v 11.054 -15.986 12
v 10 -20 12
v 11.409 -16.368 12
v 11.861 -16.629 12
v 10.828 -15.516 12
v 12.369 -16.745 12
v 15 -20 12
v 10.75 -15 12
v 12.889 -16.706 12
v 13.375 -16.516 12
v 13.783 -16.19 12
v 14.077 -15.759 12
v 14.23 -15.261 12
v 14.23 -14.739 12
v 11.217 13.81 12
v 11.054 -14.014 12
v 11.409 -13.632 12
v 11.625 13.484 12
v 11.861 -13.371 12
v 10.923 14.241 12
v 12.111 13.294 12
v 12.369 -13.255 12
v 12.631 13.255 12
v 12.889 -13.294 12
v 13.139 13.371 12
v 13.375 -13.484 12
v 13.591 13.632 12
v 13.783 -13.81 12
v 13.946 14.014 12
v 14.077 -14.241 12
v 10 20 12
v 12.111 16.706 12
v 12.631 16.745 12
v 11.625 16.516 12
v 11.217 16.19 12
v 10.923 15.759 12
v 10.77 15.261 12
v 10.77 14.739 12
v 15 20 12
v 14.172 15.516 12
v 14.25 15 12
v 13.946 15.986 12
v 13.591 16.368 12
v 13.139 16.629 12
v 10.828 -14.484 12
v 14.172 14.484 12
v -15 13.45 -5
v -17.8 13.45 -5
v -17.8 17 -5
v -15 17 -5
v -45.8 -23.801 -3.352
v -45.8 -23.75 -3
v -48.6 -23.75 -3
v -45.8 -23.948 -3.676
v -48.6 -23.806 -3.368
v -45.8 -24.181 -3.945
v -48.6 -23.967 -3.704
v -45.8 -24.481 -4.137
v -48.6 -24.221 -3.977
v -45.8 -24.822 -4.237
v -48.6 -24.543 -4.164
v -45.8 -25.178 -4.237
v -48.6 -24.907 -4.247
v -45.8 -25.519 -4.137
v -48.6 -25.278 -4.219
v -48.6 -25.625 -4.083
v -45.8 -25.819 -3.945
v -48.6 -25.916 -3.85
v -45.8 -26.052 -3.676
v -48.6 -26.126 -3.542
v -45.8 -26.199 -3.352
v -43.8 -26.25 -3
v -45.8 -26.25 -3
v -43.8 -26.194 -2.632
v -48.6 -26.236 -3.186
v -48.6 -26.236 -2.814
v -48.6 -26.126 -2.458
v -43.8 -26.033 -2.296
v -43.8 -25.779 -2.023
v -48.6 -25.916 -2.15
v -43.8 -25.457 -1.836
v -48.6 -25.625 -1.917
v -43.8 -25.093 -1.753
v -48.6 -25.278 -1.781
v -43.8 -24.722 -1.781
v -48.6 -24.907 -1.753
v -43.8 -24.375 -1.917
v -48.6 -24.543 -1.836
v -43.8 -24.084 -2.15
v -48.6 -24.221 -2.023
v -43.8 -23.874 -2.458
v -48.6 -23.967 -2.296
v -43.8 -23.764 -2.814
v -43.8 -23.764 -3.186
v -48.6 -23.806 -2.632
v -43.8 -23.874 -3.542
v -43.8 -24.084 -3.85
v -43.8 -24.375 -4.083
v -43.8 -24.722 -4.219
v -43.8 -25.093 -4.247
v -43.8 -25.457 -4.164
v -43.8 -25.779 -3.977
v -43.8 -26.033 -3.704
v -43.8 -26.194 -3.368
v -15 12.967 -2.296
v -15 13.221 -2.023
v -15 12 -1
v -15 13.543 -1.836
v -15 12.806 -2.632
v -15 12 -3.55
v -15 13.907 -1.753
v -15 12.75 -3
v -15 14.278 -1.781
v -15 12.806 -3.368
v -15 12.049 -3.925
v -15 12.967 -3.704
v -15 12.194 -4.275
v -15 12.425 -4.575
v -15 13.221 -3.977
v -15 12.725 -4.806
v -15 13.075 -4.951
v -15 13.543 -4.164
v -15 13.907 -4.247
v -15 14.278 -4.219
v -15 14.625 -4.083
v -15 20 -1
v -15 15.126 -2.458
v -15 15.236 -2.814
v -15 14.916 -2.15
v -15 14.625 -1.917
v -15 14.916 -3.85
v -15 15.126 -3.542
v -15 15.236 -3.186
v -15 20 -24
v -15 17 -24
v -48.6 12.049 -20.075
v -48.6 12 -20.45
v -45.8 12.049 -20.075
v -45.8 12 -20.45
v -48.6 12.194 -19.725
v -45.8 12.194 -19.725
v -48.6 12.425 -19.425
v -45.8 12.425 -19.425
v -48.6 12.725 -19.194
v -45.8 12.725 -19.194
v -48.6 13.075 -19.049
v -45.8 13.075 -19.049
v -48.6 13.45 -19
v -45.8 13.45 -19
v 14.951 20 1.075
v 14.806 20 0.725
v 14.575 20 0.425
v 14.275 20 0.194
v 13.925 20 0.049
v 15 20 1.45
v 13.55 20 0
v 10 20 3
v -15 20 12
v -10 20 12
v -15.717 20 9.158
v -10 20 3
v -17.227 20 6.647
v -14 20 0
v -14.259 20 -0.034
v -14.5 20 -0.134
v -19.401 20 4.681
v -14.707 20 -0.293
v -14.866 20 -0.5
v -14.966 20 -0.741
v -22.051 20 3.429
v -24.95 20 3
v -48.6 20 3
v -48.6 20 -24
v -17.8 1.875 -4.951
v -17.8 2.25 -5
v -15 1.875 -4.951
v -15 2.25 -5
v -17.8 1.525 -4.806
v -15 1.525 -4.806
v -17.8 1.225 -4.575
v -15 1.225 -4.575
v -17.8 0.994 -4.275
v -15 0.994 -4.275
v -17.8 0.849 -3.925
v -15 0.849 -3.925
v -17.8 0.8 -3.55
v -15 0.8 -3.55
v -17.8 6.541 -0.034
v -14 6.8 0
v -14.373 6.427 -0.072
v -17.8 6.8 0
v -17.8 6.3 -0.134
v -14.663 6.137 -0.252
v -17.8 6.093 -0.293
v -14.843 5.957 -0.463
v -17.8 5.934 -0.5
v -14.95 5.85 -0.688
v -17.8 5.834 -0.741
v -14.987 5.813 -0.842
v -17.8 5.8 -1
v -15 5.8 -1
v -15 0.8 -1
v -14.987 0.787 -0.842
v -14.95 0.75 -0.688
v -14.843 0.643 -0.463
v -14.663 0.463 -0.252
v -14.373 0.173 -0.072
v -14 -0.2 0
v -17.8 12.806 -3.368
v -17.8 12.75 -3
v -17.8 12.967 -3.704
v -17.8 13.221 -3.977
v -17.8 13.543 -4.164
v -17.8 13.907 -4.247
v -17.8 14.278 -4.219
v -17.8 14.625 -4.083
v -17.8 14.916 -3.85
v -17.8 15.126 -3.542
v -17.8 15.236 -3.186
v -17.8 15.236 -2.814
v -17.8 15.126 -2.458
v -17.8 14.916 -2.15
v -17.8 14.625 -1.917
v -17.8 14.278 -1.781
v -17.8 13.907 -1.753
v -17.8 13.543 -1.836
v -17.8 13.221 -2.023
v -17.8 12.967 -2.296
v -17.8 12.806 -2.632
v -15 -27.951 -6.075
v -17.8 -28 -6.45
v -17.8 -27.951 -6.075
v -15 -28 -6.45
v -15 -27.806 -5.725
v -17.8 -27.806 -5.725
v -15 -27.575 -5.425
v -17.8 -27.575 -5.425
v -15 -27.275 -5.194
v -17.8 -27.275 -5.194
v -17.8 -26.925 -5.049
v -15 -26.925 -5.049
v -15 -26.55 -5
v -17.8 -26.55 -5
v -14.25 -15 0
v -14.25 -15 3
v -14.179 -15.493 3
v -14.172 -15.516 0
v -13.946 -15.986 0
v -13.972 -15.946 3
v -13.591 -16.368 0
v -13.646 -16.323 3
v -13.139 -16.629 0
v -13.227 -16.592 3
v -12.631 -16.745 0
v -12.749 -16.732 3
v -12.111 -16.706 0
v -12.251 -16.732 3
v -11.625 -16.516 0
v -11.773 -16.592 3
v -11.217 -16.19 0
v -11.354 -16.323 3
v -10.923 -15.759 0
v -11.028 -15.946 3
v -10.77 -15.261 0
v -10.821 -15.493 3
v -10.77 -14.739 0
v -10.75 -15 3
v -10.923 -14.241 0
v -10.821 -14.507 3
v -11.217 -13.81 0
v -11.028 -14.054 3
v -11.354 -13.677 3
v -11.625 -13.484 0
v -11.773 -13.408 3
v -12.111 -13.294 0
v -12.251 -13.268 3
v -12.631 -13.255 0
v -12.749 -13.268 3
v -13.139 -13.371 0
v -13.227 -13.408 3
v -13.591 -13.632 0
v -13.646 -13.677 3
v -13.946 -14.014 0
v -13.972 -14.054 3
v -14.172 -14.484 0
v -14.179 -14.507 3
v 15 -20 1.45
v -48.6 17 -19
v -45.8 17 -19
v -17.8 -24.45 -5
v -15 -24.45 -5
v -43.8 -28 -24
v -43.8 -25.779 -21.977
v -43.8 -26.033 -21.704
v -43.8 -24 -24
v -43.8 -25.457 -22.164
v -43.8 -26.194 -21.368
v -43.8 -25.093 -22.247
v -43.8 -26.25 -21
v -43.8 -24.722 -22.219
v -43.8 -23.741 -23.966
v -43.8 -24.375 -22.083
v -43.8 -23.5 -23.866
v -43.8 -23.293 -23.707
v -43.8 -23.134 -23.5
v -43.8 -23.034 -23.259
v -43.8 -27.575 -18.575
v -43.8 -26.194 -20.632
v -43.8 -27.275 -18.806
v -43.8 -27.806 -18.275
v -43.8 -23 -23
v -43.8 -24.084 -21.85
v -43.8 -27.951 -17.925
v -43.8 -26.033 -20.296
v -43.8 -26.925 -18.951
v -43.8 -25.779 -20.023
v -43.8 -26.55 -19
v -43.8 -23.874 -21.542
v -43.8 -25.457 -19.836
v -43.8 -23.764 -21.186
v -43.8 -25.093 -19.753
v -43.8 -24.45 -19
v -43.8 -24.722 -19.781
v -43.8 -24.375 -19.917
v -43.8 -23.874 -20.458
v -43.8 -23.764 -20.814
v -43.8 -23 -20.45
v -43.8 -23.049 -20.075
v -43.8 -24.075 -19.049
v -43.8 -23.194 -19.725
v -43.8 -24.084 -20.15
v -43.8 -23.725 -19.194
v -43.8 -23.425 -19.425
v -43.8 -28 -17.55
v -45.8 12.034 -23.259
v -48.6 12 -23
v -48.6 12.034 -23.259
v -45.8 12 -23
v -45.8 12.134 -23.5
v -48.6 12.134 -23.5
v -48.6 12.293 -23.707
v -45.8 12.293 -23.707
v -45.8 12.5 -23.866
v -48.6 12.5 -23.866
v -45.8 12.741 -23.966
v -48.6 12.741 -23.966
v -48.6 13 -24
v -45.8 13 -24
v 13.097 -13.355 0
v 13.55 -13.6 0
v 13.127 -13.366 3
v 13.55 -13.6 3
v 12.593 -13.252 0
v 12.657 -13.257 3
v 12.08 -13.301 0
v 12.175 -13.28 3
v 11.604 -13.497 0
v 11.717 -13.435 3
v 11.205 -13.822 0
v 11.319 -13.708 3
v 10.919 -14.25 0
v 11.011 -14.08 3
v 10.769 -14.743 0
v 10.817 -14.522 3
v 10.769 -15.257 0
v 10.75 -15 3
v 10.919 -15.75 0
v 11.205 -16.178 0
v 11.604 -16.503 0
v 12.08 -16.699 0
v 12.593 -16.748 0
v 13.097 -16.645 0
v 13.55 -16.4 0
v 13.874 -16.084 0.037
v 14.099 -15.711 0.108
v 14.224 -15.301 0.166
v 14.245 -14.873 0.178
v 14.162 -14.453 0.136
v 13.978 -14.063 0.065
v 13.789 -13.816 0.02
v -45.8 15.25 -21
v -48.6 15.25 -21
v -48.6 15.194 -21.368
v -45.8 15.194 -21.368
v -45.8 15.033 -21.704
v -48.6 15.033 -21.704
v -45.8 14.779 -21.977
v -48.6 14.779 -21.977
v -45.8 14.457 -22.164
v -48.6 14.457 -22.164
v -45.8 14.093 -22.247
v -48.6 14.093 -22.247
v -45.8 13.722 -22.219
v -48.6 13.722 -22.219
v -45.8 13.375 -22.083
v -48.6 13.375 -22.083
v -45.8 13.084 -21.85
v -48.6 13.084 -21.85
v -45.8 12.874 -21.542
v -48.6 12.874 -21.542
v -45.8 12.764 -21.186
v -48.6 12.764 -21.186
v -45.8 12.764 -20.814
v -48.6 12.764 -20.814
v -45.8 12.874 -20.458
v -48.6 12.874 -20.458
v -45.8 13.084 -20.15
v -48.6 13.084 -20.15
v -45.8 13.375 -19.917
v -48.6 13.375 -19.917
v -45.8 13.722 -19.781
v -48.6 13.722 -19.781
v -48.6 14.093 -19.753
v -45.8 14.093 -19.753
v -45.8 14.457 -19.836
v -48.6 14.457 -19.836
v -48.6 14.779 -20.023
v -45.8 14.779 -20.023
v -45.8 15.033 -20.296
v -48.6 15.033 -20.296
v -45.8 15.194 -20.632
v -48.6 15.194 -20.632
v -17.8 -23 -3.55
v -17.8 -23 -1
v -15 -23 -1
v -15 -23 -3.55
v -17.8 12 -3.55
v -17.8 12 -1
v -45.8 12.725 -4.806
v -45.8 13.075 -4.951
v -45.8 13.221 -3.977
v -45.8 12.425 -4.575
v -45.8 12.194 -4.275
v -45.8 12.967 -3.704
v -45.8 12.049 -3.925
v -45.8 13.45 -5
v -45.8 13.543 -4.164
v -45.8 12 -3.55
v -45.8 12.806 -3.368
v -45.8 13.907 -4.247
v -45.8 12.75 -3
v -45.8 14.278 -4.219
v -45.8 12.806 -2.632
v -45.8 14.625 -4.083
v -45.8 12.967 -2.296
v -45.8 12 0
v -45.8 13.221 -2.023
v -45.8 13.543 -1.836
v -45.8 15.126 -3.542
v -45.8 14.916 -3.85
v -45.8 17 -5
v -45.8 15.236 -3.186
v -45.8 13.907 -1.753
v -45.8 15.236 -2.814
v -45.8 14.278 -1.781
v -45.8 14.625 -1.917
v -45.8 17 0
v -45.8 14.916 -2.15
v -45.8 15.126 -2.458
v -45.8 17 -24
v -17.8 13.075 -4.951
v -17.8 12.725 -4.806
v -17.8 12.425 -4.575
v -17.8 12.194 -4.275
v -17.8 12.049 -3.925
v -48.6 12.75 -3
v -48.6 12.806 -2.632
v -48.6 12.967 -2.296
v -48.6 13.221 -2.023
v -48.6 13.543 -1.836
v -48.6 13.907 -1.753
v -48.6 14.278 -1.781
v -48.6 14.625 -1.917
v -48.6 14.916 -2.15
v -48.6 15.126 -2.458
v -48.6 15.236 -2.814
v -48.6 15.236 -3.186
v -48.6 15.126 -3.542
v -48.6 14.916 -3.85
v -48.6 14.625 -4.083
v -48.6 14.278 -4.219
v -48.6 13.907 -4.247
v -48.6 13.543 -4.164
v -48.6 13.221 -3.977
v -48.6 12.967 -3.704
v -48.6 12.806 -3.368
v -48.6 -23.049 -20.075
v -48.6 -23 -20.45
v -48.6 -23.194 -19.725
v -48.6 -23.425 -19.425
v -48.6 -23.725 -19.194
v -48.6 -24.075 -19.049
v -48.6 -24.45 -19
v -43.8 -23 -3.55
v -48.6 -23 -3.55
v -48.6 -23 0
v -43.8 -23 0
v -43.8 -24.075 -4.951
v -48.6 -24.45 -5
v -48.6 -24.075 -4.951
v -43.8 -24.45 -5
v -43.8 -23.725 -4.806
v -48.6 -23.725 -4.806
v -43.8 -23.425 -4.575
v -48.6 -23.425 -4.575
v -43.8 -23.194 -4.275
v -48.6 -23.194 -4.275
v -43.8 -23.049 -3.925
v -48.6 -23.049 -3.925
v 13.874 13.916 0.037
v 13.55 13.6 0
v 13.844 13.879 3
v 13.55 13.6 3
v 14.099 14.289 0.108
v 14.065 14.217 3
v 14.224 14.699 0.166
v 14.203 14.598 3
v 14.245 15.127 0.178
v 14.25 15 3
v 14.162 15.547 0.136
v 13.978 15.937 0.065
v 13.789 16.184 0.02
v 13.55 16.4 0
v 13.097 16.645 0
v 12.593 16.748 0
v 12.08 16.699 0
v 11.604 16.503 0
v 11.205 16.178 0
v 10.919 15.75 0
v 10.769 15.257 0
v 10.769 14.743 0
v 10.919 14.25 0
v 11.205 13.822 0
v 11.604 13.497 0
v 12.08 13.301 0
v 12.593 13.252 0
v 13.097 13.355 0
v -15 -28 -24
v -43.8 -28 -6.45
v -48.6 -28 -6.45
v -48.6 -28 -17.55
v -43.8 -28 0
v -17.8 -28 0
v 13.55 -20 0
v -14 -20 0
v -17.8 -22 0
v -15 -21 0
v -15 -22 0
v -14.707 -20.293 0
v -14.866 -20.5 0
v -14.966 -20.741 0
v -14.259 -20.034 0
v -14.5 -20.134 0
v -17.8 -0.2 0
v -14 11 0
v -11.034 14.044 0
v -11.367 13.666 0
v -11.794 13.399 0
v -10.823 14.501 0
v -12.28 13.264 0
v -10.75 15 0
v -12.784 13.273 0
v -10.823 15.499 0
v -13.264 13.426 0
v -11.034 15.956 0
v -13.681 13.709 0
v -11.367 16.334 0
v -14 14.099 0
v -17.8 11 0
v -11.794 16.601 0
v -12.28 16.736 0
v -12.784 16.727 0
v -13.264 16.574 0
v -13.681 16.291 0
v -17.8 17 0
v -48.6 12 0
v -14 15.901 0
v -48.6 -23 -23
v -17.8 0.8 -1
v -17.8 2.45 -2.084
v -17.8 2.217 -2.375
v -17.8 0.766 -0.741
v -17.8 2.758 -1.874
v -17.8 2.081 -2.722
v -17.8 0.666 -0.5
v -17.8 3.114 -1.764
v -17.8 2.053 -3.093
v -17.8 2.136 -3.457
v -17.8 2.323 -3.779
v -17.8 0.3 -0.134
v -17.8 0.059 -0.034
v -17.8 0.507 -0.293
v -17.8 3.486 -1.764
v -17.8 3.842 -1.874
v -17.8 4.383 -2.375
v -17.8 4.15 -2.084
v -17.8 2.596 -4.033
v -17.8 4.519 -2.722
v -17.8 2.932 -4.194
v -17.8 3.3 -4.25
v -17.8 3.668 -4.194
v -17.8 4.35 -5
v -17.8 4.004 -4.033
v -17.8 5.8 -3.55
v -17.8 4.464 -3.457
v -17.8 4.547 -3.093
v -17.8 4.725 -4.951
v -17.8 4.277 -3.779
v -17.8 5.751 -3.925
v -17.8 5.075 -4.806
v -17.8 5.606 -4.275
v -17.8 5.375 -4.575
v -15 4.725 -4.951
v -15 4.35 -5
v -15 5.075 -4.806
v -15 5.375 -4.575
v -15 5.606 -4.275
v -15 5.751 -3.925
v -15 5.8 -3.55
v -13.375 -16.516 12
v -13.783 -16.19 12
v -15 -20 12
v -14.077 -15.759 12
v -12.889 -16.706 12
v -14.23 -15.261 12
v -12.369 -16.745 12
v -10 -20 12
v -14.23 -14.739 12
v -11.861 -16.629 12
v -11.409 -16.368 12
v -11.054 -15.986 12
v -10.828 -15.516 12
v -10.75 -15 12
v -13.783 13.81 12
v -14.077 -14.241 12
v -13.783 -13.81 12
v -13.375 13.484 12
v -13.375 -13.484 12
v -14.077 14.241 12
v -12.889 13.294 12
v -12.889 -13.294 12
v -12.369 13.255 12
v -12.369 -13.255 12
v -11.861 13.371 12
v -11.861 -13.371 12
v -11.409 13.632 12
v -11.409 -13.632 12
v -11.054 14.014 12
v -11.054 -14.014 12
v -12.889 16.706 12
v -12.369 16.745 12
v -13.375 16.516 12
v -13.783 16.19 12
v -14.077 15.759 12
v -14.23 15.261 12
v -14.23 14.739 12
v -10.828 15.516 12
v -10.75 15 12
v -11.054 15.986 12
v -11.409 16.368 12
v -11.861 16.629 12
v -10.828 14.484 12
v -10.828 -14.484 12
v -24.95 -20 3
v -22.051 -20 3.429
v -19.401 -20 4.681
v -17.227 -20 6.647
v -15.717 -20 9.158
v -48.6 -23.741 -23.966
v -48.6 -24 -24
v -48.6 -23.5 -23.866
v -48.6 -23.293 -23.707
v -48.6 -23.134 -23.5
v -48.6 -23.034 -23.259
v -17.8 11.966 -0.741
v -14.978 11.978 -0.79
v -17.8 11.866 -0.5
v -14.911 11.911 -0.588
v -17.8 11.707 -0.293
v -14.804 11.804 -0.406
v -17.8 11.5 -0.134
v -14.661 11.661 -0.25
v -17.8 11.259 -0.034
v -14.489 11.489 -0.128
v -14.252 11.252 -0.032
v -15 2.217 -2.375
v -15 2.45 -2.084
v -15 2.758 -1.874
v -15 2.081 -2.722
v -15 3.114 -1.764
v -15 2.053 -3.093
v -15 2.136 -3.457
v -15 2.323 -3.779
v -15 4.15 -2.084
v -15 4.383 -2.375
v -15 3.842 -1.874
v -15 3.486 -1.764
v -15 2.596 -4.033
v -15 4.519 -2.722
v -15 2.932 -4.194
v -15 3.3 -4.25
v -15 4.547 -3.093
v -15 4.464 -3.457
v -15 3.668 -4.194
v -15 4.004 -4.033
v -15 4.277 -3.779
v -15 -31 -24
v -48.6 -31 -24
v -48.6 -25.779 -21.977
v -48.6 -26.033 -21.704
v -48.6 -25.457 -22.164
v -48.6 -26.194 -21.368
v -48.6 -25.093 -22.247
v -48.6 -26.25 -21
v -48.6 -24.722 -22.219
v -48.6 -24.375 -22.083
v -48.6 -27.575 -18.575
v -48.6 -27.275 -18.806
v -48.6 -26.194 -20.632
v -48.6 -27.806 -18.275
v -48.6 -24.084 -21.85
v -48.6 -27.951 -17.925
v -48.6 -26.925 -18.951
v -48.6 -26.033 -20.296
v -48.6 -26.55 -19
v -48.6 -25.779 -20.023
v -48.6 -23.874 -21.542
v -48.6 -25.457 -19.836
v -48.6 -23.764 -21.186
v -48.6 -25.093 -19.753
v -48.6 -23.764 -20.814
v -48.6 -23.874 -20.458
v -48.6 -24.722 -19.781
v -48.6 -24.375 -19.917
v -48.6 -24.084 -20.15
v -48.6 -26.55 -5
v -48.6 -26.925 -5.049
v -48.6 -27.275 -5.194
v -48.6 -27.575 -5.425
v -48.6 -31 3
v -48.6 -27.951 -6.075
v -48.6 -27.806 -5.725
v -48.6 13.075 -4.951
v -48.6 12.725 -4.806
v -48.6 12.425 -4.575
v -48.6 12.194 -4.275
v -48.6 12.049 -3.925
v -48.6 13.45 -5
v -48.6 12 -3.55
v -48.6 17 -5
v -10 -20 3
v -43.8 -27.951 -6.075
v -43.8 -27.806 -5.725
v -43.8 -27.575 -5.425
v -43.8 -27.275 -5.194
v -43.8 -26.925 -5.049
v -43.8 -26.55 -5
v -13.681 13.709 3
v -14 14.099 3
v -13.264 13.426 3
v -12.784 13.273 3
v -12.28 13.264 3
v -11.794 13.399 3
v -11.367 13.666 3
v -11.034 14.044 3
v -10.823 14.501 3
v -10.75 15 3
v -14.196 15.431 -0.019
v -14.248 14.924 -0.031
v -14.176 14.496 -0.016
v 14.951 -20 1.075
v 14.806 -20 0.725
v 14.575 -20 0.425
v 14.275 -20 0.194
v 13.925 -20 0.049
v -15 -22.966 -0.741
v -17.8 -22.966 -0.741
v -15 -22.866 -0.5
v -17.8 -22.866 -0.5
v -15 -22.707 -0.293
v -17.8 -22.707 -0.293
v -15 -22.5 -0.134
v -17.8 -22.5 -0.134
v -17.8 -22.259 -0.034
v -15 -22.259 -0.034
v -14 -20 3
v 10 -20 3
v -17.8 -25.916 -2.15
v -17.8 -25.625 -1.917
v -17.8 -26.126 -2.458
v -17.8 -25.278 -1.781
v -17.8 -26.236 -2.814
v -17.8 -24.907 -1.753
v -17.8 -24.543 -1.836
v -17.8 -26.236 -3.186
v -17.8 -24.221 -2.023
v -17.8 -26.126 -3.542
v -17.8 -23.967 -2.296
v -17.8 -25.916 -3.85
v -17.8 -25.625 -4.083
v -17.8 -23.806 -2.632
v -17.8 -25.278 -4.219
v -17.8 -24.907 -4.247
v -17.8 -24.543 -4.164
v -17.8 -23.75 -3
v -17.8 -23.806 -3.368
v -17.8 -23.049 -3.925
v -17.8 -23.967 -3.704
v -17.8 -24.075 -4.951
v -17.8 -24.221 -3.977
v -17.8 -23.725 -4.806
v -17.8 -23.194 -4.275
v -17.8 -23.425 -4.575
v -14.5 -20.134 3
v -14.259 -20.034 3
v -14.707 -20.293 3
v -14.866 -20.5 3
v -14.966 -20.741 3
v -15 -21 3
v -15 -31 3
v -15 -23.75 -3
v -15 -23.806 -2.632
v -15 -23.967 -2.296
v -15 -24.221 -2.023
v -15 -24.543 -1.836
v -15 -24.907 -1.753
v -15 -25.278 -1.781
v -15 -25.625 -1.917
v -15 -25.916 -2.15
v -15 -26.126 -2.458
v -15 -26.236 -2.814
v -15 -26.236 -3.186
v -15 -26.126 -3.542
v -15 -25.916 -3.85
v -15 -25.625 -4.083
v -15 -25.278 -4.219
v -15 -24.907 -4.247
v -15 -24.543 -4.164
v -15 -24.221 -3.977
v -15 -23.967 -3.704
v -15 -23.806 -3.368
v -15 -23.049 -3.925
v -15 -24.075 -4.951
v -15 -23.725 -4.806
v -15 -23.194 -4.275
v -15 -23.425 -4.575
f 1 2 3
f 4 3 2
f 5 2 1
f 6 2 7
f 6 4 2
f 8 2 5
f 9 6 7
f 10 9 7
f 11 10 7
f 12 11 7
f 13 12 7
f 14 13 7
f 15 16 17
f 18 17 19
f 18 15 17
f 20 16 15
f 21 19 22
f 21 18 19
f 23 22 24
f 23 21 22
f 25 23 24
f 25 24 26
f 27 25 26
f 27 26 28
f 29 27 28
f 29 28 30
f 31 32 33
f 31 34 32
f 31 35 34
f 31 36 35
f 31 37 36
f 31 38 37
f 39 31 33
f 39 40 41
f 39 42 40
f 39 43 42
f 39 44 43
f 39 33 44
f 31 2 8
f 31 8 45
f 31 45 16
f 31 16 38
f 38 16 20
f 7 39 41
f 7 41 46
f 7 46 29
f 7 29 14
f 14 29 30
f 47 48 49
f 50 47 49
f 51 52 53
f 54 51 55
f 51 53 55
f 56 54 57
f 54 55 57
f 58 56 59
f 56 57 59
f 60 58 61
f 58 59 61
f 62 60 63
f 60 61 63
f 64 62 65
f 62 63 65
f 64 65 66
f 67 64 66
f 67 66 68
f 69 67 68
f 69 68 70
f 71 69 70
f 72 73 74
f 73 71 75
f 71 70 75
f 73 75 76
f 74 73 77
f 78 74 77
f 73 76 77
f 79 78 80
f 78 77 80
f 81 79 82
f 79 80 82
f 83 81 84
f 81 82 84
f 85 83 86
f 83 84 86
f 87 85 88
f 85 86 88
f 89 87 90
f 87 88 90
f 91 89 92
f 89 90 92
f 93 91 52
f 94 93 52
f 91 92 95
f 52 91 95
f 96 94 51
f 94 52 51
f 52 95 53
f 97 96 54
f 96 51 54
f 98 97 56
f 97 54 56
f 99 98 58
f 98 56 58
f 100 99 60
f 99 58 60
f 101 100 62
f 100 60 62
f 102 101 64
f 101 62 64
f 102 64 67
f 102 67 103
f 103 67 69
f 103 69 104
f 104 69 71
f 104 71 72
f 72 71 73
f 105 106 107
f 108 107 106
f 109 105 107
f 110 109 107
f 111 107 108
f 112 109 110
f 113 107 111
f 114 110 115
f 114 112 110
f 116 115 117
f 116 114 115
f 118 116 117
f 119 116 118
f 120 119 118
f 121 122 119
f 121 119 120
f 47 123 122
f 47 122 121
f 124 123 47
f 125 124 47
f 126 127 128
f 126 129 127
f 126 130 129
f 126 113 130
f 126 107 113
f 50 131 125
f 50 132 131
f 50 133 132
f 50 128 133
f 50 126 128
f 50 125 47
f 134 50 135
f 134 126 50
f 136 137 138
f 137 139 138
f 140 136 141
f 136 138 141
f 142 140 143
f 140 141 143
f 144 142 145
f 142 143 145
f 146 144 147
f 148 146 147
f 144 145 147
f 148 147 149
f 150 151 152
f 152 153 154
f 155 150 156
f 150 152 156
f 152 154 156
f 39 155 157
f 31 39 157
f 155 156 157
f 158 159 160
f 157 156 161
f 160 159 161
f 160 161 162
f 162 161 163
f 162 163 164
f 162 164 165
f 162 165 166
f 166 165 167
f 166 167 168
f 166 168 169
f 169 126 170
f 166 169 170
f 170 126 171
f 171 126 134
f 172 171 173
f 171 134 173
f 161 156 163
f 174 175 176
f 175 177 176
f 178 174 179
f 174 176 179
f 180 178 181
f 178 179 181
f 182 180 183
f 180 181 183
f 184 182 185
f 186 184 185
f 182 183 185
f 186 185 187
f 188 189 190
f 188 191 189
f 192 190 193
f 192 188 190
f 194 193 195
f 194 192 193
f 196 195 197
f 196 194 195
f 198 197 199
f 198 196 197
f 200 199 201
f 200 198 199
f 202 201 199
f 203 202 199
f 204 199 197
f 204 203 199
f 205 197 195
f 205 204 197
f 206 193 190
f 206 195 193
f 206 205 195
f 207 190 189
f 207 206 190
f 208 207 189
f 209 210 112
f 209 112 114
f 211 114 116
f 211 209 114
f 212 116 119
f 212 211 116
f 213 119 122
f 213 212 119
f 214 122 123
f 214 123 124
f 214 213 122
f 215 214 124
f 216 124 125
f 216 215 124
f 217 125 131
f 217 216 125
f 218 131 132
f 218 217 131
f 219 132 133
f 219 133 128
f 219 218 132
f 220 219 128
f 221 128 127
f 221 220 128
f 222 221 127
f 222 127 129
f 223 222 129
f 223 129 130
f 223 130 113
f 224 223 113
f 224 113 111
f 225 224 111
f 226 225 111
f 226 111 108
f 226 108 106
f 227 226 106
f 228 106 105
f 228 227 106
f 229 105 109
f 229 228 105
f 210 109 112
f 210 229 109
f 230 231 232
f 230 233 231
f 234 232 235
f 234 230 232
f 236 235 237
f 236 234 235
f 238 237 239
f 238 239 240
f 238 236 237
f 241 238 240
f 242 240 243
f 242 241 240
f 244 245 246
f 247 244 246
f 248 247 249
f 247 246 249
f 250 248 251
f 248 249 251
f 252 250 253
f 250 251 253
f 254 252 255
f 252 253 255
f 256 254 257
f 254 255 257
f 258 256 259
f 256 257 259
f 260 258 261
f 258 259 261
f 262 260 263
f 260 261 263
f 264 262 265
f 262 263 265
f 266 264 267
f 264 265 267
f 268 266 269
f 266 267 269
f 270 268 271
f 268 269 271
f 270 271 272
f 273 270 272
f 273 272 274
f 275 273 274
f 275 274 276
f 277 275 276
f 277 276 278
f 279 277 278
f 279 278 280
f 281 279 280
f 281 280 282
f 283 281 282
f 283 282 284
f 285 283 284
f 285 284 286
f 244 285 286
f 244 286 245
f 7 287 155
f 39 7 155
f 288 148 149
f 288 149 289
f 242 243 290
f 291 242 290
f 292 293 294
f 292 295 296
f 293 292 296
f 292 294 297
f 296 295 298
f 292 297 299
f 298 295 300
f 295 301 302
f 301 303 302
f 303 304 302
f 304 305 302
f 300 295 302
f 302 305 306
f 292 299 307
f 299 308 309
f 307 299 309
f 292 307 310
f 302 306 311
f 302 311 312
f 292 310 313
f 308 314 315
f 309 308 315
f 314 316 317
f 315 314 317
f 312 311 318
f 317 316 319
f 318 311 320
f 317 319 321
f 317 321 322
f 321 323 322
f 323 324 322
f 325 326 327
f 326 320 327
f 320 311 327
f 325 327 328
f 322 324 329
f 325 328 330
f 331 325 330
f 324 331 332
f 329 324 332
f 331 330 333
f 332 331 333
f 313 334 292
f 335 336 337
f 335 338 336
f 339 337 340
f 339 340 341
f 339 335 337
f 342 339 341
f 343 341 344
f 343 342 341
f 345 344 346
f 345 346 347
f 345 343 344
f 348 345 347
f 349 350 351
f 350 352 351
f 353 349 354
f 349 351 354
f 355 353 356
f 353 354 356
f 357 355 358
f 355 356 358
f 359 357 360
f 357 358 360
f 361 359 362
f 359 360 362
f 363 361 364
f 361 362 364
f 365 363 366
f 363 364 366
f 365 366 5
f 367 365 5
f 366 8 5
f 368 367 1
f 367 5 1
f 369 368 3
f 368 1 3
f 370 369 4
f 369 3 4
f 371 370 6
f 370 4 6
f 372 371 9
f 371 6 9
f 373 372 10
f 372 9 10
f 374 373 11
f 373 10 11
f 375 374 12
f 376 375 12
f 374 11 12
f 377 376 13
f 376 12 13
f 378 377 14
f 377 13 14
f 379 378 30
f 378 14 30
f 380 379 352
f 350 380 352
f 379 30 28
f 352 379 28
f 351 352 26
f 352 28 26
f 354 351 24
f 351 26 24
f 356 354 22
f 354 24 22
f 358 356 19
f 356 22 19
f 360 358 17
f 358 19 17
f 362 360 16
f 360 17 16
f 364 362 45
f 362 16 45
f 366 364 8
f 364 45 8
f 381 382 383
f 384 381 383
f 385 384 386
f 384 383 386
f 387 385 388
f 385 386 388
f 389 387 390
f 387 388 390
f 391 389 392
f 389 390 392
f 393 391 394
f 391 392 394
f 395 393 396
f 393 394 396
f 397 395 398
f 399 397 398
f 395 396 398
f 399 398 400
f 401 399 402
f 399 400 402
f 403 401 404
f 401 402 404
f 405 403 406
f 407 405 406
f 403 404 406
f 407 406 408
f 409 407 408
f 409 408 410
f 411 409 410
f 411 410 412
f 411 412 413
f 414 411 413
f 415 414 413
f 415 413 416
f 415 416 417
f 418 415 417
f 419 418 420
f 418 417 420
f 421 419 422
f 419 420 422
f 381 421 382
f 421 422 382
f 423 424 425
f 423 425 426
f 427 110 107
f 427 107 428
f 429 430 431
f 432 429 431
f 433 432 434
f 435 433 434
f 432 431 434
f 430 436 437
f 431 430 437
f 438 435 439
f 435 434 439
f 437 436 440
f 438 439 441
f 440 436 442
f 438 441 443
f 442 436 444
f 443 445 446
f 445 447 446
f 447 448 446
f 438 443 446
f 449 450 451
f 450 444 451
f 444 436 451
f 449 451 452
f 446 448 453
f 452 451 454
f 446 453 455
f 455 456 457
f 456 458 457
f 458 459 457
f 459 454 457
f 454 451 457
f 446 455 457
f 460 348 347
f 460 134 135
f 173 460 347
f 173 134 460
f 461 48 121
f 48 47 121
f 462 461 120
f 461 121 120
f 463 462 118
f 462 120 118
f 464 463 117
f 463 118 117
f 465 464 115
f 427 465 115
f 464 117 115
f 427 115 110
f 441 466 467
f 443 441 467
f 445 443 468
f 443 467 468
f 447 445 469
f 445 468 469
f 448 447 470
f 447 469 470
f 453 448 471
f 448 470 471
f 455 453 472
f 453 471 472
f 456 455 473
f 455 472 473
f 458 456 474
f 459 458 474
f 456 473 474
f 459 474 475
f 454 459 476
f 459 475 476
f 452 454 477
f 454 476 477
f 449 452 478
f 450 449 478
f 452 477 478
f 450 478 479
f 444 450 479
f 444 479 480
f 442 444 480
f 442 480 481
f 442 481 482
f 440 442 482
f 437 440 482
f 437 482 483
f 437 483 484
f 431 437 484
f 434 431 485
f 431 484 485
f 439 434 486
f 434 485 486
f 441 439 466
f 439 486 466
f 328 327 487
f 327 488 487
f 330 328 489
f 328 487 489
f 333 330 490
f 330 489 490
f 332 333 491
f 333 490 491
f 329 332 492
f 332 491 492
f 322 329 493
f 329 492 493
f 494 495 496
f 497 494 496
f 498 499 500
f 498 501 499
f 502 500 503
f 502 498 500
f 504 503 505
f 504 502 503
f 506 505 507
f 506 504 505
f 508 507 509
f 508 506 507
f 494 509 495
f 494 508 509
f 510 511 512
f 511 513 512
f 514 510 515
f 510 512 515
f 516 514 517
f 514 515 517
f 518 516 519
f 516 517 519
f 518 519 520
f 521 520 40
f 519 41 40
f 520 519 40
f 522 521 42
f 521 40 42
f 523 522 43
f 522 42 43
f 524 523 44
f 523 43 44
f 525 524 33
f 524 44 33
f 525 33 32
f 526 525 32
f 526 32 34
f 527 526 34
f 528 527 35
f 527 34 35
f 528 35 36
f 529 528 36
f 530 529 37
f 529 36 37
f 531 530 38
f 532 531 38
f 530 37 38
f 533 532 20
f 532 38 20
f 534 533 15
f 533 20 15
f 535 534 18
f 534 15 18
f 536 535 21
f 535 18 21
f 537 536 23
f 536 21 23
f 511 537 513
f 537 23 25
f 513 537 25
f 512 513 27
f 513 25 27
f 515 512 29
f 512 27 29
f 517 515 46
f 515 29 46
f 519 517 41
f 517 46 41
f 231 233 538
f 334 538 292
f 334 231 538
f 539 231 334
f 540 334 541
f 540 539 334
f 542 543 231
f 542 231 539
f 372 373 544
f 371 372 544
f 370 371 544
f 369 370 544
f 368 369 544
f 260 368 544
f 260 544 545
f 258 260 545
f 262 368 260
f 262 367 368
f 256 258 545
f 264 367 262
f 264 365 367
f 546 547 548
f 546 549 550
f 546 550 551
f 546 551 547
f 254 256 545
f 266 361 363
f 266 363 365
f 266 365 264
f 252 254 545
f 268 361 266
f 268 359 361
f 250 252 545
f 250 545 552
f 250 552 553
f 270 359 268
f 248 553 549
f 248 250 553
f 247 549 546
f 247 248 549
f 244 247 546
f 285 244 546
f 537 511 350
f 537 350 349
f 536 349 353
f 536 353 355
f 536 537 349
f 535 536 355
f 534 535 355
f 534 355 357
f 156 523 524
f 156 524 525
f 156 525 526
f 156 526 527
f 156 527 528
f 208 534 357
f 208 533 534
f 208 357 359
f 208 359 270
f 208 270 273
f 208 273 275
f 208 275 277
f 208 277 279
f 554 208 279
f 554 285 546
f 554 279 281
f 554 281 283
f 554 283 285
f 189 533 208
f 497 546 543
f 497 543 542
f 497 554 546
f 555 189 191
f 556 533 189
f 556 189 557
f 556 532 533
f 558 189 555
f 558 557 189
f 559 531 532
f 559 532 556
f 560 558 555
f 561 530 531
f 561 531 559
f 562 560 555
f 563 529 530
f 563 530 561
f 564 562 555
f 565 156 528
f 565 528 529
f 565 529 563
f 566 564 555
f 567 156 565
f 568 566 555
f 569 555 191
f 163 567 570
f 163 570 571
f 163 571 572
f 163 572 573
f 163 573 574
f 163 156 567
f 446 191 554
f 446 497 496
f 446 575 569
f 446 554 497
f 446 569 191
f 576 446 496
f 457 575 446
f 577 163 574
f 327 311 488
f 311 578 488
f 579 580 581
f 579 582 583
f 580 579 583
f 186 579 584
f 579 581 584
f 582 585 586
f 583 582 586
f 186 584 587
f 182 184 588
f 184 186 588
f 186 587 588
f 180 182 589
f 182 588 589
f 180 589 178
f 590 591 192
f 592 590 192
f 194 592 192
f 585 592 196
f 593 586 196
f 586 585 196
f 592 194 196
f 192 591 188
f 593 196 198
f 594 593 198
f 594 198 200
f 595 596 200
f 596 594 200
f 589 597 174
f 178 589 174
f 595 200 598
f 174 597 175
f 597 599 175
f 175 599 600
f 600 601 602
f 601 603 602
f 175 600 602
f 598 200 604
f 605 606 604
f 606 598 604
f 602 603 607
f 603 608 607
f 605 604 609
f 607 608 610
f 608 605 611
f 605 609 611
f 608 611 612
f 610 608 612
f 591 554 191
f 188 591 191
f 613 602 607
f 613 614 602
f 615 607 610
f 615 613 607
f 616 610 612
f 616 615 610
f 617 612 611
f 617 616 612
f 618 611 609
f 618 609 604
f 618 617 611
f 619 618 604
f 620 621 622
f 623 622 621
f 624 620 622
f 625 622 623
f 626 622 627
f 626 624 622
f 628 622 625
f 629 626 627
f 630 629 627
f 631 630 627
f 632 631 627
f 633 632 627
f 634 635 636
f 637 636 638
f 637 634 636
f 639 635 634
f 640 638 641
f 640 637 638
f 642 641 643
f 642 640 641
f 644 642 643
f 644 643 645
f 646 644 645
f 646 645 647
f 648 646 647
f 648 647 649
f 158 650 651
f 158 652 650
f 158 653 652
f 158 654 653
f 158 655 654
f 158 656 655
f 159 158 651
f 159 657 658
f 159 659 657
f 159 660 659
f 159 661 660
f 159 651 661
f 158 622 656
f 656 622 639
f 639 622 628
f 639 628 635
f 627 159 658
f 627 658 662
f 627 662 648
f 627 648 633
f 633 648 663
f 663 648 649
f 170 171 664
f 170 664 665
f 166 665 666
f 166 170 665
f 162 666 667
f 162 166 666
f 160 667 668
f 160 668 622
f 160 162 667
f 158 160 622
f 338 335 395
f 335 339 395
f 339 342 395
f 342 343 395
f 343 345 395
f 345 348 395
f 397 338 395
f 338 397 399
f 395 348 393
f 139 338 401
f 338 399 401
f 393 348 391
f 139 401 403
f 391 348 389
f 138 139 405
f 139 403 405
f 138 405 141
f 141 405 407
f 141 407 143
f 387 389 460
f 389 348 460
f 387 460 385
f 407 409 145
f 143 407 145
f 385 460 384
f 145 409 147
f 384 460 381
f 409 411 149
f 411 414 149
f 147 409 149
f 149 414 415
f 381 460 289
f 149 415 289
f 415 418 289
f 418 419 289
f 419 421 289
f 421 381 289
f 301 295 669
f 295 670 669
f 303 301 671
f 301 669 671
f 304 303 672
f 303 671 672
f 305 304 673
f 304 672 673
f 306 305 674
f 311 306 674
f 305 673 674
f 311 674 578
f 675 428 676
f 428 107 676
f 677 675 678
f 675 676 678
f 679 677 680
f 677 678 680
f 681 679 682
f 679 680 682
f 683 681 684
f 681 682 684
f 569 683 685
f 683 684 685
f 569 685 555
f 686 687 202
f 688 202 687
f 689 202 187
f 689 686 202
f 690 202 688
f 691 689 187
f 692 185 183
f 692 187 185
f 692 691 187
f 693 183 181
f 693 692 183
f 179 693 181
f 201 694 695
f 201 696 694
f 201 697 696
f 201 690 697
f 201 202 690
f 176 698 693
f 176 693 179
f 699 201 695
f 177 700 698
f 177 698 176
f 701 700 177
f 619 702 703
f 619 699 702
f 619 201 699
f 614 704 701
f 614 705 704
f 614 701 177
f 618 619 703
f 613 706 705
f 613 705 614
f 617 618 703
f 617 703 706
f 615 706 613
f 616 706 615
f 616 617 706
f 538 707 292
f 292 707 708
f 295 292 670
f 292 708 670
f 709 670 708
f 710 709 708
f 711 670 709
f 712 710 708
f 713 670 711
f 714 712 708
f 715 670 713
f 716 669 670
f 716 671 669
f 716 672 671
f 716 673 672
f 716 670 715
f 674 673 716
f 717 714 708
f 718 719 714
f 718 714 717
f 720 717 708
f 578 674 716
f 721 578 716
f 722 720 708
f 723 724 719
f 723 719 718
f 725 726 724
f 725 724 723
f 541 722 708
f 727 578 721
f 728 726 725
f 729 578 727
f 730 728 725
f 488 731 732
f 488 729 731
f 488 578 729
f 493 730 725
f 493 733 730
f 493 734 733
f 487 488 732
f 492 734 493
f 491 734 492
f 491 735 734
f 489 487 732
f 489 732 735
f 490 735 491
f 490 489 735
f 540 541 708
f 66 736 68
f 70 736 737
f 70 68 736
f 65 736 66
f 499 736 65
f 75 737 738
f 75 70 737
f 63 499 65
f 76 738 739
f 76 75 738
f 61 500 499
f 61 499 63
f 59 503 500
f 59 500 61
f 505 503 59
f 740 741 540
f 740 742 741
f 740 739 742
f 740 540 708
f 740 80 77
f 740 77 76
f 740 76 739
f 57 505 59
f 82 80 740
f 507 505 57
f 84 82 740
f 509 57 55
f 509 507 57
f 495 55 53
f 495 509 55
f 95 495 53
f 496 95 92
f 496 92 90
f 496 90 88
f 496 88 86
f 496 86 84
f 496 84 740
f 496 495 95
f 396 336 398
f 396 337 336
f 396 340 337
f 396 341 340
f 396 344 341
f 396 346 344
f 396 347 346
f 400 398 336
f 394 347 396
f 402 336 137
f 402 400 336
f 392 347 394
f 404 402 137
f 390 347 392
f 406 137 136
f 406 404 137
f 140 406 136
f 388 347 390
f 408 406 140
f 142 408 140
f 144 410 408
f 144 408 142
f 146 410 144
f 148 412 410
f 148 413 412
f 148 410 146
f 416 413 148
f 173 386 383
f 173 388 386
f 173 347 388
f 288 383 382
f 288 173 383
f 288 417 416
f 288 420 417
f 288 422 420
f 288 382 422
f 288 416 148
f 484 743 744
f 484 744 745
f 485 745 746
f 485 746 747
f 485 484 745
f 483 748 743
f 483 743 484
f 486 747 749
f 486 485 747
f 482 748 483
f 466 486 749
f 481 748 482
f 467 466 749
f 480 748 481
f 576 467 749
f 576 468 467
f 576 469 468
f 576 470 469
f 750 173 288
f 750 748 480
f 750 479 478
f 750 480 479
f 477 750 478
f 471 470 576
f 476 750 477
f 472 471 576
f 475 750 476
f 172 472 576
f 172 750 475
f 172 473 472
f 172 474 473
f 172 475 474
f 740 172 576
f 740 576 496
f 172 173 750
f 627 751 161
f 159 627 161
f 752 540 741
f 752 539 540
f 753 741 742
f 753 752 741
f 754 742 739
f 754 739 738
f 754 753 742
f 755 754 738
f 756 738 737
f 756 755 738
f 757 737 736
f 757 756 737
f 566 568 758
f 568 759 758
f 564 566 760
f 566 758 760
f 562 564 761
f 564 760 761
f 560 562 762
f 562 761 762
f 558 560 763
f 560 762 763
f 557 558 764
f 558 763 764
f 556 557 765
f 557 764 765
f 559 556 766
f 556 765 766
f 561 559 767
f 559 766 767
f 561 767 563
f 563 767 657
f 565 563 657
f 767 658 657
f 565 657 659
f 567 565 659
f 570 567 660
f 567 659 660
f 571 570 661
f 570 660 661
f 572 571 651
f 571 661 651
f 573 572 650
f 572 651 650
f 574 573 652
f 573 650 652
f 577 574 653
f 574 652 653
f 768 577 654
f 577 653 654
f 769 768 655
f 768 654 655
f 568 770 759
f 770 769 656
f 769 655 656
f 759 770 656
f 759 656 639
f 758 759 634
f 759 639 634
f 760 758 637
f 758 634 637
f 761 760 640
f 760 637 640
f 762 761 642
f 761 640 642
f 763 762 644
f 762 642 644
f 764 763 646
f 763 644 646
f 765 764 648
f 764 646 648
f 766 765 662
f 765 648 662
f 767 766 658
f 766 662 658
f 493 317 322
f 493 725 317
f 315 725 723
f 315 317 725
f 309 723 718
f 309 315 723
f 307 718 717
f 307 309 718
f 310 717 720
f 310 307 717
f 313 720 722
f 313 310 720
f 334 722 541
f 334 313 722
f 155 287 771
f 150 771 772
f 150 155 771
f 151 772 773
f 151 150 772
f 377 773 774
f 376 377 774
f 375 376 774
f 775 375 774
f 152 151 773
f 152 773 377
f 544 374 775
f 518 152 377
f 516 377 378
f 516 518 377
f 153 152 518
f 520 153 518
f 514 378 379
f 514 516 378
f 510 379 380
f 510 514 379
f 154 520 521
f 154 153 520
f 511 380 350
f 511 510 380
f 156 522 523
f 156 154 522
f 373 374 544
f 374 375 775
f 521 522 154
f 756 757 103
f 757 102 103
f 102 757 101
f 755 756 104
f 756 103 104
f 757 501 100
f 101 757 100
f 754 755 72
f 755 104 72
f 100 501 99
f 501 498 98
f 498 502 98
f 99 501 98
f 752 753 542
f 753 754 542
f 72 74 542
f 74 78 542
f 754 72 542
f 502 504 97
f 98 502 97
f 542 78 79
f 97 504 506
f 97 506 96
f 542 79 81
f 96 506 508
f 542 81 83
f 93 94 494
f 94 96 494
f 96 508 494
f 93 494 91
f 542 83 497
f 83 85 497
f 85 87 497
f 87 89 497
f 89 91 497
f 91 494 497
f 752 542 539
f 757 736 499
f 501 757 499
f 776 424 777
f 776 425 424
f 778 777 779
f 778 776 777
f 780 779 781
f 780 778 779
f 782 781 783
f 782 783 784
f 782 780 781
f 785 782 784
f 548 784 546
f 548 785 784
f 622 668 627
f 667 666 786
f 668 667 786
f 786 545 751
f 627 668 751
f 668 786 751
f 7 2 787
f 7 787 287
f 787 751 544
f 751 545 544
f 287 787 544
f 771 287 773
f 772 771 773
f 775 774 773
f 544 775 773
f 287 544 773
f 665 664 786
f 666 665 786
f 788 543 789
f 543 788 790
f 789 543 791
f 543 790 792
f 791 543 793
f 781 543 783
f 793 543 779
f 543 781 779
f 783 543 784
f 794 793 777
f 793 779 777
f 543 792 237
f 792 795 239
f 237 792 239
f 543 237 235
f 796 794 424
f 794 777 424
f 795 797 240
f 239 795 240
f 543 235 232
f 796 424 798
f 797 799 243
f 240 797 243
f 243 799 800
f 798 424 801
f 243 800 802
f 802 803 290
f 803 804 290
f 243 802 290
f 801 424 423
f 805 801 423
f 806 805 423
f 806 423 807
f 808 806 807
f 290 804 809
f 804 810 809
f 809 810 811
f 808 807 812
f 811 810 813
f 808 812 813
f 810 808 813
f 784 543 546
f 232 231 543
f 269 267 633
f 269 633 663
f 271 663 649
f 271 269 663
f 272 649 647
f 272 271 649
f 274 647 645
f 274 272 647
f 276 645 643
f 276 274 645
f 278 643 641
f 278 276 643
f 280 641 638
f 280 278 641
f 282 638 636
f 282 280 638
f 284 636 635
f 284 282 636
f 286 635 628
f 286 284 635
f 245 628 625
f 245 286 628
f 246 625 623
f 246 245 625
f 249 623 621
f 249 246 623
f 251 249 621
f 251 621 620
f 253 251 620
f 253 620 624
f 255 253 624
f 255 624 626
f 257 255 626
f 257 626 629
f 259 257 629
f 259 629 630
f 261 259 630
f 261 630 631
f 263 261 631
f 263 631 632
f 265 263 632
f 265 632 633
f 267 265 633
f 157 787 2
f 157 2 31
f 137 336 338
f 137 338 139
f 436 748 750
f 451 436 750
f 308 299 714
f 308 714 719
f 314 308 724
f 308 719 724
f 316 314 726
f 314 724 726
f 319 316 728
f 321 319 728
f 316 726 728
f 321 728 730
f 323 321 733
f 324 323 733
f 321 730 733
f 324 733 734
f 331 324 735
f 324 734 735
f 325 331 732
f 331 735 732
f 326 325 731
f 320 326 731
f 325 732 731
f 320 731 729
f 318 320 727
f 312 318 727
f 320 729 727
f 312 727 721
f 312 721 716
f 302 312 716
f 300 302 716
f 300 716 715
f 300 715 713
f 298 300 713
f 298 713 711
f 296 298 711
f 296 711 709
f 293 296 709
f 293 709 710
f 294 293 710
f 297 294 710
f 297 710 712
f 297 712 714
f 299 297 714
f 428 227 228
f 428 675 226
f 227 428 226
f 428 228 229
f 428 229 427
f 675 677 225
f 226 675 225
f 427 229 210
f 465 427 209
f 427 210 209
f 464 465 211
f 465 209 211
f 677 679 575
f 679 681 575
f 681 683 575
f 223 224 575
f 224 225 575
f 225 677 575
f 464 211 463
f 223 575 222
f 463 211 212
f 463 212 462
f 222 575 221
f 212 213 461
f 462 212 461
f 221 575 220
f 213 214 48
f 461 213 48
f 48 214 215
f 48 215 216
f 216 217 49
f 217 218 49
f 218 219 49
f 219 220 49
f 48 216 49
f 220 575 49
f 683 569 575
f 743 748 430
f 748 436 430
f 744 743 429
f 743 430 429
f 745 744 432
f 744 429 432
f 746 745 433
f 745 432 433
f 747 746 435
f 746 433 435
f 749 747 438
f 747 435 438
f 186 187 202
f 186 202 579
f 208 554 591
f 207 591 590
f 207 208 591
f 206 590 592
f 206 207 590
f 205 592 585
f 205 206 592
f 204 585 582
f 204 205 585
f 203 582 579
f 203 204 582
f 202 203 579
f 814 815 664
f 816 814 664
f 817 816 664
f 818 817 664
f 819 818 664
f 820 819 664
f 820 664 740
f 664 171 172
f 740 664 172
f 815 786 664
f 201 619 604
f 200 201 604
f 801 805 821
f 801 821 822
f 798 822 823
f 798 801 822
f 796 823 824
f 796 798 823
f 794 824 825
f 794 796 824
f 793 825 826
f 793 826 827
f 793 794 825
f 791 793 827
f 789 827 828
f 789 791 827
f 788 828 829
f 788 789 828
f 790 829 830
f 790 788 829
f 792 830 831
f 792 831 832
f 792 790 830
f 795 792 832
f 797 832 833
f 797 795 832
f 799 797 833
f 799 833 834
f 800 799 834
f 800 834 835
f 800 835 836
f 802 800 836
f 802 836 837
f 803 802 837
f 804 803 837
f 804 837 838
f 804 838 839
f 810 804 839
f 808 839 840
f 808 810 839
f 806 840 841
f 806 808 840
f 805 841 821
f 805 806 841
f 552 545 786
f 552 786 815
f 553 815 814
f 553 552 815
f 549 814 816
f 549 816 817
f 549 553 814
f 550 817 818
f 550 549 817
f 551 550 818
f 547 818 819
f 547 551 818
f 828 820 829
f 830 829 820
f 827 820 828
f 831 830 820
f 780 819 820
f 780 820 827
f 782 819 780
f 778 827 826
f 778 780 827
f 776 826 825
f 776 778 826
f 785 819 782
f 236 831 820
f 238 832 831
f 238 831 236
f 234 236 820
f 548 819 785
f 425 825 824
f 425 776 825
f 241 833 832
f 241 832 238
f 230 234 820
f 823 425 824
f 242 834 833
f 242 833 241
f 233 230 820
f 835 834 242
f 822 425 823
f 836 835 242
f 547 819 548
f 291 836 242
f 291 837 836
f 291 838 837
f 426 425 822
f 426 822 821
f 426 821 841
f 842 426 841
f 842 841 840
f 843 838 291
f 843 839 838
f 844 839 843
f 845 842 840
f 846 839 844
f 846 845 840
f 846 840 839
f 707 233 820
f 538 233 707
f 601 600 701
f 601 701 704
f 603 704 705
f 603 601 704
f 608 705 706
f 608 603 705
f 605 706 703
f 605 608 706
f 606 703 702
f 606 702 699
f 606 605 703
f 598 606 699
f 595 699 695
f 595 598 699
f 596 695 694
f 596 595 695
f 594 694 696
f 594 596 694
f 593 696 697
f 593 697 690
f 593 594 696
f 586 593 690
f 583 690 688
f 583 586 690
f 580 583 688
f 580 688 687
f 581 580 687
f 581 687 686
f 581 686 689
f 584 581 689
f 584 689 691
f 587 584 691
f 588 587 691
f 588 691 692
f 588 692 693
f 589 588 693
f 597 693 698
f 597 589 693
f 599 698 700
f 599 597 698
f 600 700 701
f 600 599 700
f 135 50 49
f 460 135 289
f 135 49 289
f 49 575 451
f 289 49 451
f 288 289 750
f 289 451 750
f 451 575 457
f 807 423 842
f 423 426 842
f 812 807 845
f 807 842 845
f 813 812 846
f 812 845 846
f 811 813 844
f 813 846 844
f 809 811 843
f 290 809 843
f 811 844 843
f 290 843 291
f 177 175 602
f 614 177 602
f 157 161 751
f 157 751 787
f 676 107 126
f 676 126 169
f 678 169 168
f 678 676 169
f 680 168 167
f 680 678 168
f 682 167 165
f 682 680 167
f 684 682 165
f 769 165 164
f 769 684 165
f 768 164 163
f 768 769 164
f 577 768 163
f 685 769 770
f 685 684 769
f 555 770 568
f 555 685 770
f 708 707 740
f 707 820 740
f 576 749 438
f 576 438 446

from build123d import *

# Parameters (mm, degrees)
BOSS_EXTRU_1_DEPTH      = 3
ESQUISSE3_W             = 33.6
ESQUISSE3_H             = 3
BOSS_EXTRU_2_DEPTH      = 24
ESQUISSE4_W             = 5
ESQUISSE4_H             = 5
ESQUISSE4_R             = 1.25
BOSS_EXTRU_3_DEPTH      = 2.8
BOSS_EXTRU_4_START      = -2.8
ESQUISSE5_W             = 5
ESQUISSE5_H             = 5
ESQUISSE5_R             = 1.25
BOSS_EXTRU_4_DEPTH      = 2.8
ESQUISSE4_2_W           = 5
ESQUISSE4_2_H           = 5
ESQUISSE4_2_R           = 1.25
BOSS_EXTRU_5_DEPTH      = 4.8
ESQUISSE6_W             = 5
ESQUISSE6_H             = 40
ESQUISSE6_R             = 1.75
BOSS_EXTRU_6_DEPTH      = 9
CONG_3_R                = 10
CONG_4_R                = 1
CONG_1_R                = 1.45
CONG_2_R                = 1
ENL_V_MAT_EXTRU_1_REACH = 65.655
ESQUISSE6_3_R           = 1.75


with BuildPart() as part:
    # Esquisse1 → Boss.-Extru.1 (new body)
    with BuildSketch(Plane.XY):
        Polygon((-15, -20), (15, -20), (15, 20), (-15, 20), (-48.6, 20), (-48.6, -31), (-15, -31), align=None)
    extrude(amount=BOSS_EXTRU_1_DEPTH)

    # Esquisse3 → Boss.-Extru.2 (add)
    with BuildSketch(Plane(origin=(0, 0, 0), x_dir=(-1, 0, 0), z_dir=(0, 0, -1))):
        with Locations((31.8, -29.5)):
            Rectangle(ESQUISSE3_W, ESQUISSE3_H)
        with Locations((31.8, 18.5)):
            Rectangle(ESQUISSE3_W, ESQUISSE3_H)
    extrude(amount=BOSS_EXTRU_2_DEPTH)

    # Esquisse4 → Boss.-Extru.3 (add)
    # profile 1 of 4: a face of its own
    with BuildSketch(Plane.ZY.offset(48.6)):
        with Locations((-21.5, -25.5)):
            Rectangle(ESQUISSE4_W, ESQUISSE4_H)
        with Locations(Location((-21, -25, 0), (0, 0, 270))):
            Circle(ESQUISSE4_R, mode=Mode.SUBTRACT)
    # profile 2 of 4: a face of its own
    with BuildSketch(Plane.ZY.offset(48.6)):
        with Locations((-2.5, -25.5)):
            Rectangle(ESQUISSE4_W, ESQUISSE4_H)
        with Locations(Location((-3, -25, 0), (0, 0, 90))):
            Circle(ESQUISSE4_R, mode=Mode.SUBTRACT)
    # profile 3 of 4: a face of its own
    with BuildSketch(Plane.ZY.offset(48.6)):
        with Locations((-2.5, 14.5)):
            Rectangle(ESQUISSE4_W, ESQUISSE4_H)
        with Locations(Location((-3, 14, 0), (0, 0, 270))):
            Circle(ESQUISSE4_R, mode=Mode.SUBTRACT)
    # profile 4 of 4: a face of its own
    with BuildSketch(Plane.ZY.offset(48.6)):
        with Locations((-21.5, 14.5)):
            Rectangle(ESQUISSE4_W, ESQUISSE4_H)
        with Locations(Location((-21, 14, 0), (0, 0, 90))):
            Circle(ESQUISSE4_R, mode=Mode.SUBTRACT)
    extrude(amount=-BOSS_EXTRU_3_DEPTH)

    # Esquisse5 → Boss.-Extru.4 (add)
    # profile 1 of 3: a face of its own
    with BuildSketch(Plane(origin=(-15, 0, 0), x_dir=(0, 0, -1), z_dir=(1, 0, 0)).offset(BOSS_EXTRU_4_START)):
        with Locations((2.5, -25.5)):
            Rectangle(ESQUISSE5_W, ESQUISSE5_H)
        with Locations(Location((3, -25, 0), (0, 0, 90))):
            Circle(ESQUISSE5_R, mode=Mode.SUBTRACT)
    # profile 2 of 3: a face of its own
    with BuildSketch(Plane(origin=(-15, 0, 0), x_dir=(0, 0, -1), z_dir=(1, 0, 0)).offset(BOSS_EXTRU_4_START)):
        with Locations((2.5, 14.5)):
            Rectangle(ESQUISSE5_W, ESQUISSE5_H)
        with Locations(Location((3, 14, 0), (0, 0, 270))):
            Circle(ESQUISSE5_R, mode=Mode.SUBTRACT)
    # profile 3 of 3: a face of its own
    with BuildSketch(Plane(origin=(-15, 0, 0), x_dir=(0, 0, -1), z_dir=(1, 0, 0)).offset(BOSS_EXTRU_4_START)):
        with Locations((2.5, 3.3)):
            Rectangle(ESQUISSE5_W, ESQUISSE5_H)
        with Locations((3, 3.3)):
            Circle(ESQUISSE5_R, mode=Mode.SUBTRACT)
    extrude(amount=BOSS_EXTRU_4_DEPTH)

    # Esquisse4<2> → Boss.-Extru.5 (add)
    # profile 1 of 2: a face of its own
    with BuildSketch(Plane.ZY.offset(48.6)):
        with Locations((-21.5, -25.5)):
            Rectangle(ESQUISSE4_2_W, ESQUISSE4_2_H)
        with Locations(Location((-21, -25, 0), (0, 0, 270))):
            Circle(ESQUISSE4_2_R, mode=Mode.SUBTRACT)
    # profile 2 of 2: a face of its own
    with BuildSketch(Plane.ZY.offset(48.6)):
        with Locations((-2.5, -25.5)):
            Rectangle(ESQUISSE4_2_W, ESQUISSE4_2_H)
        with Locations(Location((-3, -25, 0), (0, 0, 270))):
            Circle(ESQUISSE4_2_R, mode=Mode.SUBTRACT)
    extrude(amount=-BOSS_EXTRU_5_DEPTH)

    # Esquisse6 → Boss.-Extru.6 (add)
    # profile 1 of 2: a face of its own
    with BuildSketch(Plane.XY.offset(3)):
        with Locations((12.5, 0)):
            Rectangle(ESQUISSE6_W, ESQUISSE6_H)
        with Locations(Location((12.5, -15, 0), (0, 0, 180))):
            Circle(ESQUISSE6_R, mode=Mode.SUBTRACT)
        with Locations((12.5, 15)):
            Circle(ESQUISSE6_R, mode=Mode.SUBTRACT)
    # profile 2 of 2: a face of its own
    with BuildSketch(Plane.XY.offset(3)):
        with Locations((-12.5, 0)):
            Rectangle(ESQUISSE6_W, ESQUISSE6_H)
        with Locations((-12.5, -15)):
            Circle(ESQUISSE6_R, mode=Mode.SUBTRACT)
        with Locations((-12.5, 15)):
            Circle(ESQUISSE6_R, mode=Mode.SUBTRACT)
    extrude(amount=BOSS_EXTRU_6_DEPTH)

    # Congé3
    # the kernel refuses this fillet: 10 mm, written as the material it adds along each edge
    with BuildSketch(Plane(origin=(-15, 20, 3), x_dir=(-1, 0, 0), z_dir=(0, -1, 0))) as cong_3_piece_1:
        with BuildLine():
            CenterArc((9.949874371, -10), CONG_3_R, 90, 84.260829523)
            Line((0, -9), (0, 0))
            Line((0, 0), (9.949874371, 0))
        make_face()
    extrude(amount=40)

    # Congé4
    # the kernel refuses this fillet: 1 mm, written as the material it adds along each edge
    with BuildSketch(Plane(origin=(-15, -20, 0), x_dir=(1, 0, 0), z_dir=(0, 0, 1))) as cong_4_piece_1:
        with BuildLine():
            CenterArc((CONG_4_R, -CONG_4_R), CONG_4_R, 90, 90)
            Line((0, -CONG_4_R), (0, 0))
            Line((0, 0), (CONG_4_R, 0))
        make_face()
    extrude(amount=3)
    with BuildSketch(Plane(origin=(-15, 0.8, 0), x_dir=(1, 0, 0), z_dir=(0, 1, 0))) as cong_4_piece_2:
        with BuildLine():
            CenterArc((CONG_4_R, CONG_4_R), CONG_4_R, 180, 90)
            Line((0, CONG_4_R), (0, 0))
            Line((0, 0), (CONG_4_R, 0))
        make_face()
    extrude(amount=5)
    with BuildSketch(Plane(origin=(-15, 12, 0), x_dir=(1, 0, 0), z_dir=(0, 1, 0))) as cong_4_piece_3:
        with BuildLine():
            CenterArc((CONG_4_R, CONG_4_R), CONG_4_R, 180, 90)
            Line((0, CONG_4_R), (0, 0))
            Line((0, 0), (CONG_4_R, 0))
        make_face()
    extrude(amount=8)

    # Congé1
    cong_1_edges = [part.edges().sort_by_distance(p)[0] for p in [
        (-16.4, 12, -5),
        (-16.4, 5.8, -5),
        (-16.4, 0.8, -5),
        (-16.4, -23, -5),
        (-16.4, -28, -5),
        (-46.2, -23, -19),
        (-46.2, -28, -19),
        (-46.2, -28, -5),
        (-46.2, -23, -5),
        (-47.2, 12, -5),
        (15, 0, 0),
        (-47.2, 12, -19),
    ]]
    fillet(cong_1_edges, radius=CONG_1_R)

    # Congé2
    cong_2_edges = [part.edges().sort_by_distance(p)[0] for p in [
        (-47.2, 12, -24),
        (-16.4, -23, 0),
        (-15.9, 12, 0),
        (-15.9, 0.8, 0),
        (-15.9, 5.8, 0),
        (-46.2, -23, -24),
    ]]
    fillet(cong_2_edges, radius=CONG_2_R)

    # Esquisse6<3> → Enlèv. mat.-Extru.1 (cut, up to next)
    with BuildSketch(Plane.XY.offset(3), mode=Mode.PRIVATE) as enl_v_mat_extru_1_sk1:
        with Locations(Location((-12.5, 15, 0), (0, 0, 211.002719134))):
            Circle(ESQUISSE6_3_R)
    enl_v_mat_extru_1_tool1 = extrude(enl_v_mat_extru_1_sk1.sketch, amount=-ENL_V_MAT_EXTRU_1_REACH, mode=Mode.PRIVATE) & part.part
    # Esquisse6<3> → Enlèv. mat.-Extru.1 (cut, up to next)
    with BuildSketch(Plane.XY.offset(3), mode=Mode.PRIVATE) as enl_v_mat_extru_1_sk2:
        with Locations(Location((-12.5, -15, 0), (0, 0, 180))):
            Circle(ESQUISSE6_3_R)
    enl_v_mat_extru_1_tool2 = extrude(enl_v_mat_extru_1_sk2.sketch, amount=-ENL_V_MAT_EXTRU_1_REACH, mode=Mode.PRIVATE) & part.part
    # Esquisse6<3> → Enlèv. mat.-Extru.1 (cut, up to next)
    with BuildSketch(Plane.XY.offset(3), mode=Mode.PRIVATE) as enl_v_mat_extru_1_sk3:
        with Locations(Location((12.5, -15, 0), (0, 0, 53.130102354))):
            Circle(ESQUISSE6_3_R)
    enl_v_mat_extru_1_tool3 = extrude(enl_v_mat_extru_1_sk3.sketch, amount=-ENL_V_MAT_EXTRU_1_REACH, mode=Mode.PRIVATE) & part.part
    # Esquisse6<3> → Enlèv. mat.-Extru.1 (cut, up to next)
    with BuildSketch(Plane.XY.offset(3), mode=Mode.PRIVATE) as enl_v_mat_extru_1_sk4:
        with Locations(Location((12.5, 15, 0), (0, 0, 306.869897646))):
            Circle(ESQUISSE6_3_R)
    enl_v_mat_extru_1_tool4 = extrude(enl_v_mat_extru_1_sk4.sketch, amount=-ENL_V_MAT_EXTRU_1_REACH, mode=Mode.PRIVATE) & part.part
    add(enl_v_mat_extru_1_tool1.solids().sort_by_distance((-12.5, 15, 3))[0], mode=Mode.SUBTRACT)
    add(enl_v_mat_extru_1_tool2.solids().sort_by_distance((-12.5, -15, 3))[0], mode=Mode.SUBTRACT)
    add(enl_v_mat_extru_1_tool3.solids().sort_by_distance((12.5, -15, 3))[0], mode=Mode.SUBTRACT)
    add(enl_v_mat_extru_1_tool4.solids().sort_by_distance((12.5, 15, 3))[0], mode=Mode.SUBTRACT)


solid = part.part
